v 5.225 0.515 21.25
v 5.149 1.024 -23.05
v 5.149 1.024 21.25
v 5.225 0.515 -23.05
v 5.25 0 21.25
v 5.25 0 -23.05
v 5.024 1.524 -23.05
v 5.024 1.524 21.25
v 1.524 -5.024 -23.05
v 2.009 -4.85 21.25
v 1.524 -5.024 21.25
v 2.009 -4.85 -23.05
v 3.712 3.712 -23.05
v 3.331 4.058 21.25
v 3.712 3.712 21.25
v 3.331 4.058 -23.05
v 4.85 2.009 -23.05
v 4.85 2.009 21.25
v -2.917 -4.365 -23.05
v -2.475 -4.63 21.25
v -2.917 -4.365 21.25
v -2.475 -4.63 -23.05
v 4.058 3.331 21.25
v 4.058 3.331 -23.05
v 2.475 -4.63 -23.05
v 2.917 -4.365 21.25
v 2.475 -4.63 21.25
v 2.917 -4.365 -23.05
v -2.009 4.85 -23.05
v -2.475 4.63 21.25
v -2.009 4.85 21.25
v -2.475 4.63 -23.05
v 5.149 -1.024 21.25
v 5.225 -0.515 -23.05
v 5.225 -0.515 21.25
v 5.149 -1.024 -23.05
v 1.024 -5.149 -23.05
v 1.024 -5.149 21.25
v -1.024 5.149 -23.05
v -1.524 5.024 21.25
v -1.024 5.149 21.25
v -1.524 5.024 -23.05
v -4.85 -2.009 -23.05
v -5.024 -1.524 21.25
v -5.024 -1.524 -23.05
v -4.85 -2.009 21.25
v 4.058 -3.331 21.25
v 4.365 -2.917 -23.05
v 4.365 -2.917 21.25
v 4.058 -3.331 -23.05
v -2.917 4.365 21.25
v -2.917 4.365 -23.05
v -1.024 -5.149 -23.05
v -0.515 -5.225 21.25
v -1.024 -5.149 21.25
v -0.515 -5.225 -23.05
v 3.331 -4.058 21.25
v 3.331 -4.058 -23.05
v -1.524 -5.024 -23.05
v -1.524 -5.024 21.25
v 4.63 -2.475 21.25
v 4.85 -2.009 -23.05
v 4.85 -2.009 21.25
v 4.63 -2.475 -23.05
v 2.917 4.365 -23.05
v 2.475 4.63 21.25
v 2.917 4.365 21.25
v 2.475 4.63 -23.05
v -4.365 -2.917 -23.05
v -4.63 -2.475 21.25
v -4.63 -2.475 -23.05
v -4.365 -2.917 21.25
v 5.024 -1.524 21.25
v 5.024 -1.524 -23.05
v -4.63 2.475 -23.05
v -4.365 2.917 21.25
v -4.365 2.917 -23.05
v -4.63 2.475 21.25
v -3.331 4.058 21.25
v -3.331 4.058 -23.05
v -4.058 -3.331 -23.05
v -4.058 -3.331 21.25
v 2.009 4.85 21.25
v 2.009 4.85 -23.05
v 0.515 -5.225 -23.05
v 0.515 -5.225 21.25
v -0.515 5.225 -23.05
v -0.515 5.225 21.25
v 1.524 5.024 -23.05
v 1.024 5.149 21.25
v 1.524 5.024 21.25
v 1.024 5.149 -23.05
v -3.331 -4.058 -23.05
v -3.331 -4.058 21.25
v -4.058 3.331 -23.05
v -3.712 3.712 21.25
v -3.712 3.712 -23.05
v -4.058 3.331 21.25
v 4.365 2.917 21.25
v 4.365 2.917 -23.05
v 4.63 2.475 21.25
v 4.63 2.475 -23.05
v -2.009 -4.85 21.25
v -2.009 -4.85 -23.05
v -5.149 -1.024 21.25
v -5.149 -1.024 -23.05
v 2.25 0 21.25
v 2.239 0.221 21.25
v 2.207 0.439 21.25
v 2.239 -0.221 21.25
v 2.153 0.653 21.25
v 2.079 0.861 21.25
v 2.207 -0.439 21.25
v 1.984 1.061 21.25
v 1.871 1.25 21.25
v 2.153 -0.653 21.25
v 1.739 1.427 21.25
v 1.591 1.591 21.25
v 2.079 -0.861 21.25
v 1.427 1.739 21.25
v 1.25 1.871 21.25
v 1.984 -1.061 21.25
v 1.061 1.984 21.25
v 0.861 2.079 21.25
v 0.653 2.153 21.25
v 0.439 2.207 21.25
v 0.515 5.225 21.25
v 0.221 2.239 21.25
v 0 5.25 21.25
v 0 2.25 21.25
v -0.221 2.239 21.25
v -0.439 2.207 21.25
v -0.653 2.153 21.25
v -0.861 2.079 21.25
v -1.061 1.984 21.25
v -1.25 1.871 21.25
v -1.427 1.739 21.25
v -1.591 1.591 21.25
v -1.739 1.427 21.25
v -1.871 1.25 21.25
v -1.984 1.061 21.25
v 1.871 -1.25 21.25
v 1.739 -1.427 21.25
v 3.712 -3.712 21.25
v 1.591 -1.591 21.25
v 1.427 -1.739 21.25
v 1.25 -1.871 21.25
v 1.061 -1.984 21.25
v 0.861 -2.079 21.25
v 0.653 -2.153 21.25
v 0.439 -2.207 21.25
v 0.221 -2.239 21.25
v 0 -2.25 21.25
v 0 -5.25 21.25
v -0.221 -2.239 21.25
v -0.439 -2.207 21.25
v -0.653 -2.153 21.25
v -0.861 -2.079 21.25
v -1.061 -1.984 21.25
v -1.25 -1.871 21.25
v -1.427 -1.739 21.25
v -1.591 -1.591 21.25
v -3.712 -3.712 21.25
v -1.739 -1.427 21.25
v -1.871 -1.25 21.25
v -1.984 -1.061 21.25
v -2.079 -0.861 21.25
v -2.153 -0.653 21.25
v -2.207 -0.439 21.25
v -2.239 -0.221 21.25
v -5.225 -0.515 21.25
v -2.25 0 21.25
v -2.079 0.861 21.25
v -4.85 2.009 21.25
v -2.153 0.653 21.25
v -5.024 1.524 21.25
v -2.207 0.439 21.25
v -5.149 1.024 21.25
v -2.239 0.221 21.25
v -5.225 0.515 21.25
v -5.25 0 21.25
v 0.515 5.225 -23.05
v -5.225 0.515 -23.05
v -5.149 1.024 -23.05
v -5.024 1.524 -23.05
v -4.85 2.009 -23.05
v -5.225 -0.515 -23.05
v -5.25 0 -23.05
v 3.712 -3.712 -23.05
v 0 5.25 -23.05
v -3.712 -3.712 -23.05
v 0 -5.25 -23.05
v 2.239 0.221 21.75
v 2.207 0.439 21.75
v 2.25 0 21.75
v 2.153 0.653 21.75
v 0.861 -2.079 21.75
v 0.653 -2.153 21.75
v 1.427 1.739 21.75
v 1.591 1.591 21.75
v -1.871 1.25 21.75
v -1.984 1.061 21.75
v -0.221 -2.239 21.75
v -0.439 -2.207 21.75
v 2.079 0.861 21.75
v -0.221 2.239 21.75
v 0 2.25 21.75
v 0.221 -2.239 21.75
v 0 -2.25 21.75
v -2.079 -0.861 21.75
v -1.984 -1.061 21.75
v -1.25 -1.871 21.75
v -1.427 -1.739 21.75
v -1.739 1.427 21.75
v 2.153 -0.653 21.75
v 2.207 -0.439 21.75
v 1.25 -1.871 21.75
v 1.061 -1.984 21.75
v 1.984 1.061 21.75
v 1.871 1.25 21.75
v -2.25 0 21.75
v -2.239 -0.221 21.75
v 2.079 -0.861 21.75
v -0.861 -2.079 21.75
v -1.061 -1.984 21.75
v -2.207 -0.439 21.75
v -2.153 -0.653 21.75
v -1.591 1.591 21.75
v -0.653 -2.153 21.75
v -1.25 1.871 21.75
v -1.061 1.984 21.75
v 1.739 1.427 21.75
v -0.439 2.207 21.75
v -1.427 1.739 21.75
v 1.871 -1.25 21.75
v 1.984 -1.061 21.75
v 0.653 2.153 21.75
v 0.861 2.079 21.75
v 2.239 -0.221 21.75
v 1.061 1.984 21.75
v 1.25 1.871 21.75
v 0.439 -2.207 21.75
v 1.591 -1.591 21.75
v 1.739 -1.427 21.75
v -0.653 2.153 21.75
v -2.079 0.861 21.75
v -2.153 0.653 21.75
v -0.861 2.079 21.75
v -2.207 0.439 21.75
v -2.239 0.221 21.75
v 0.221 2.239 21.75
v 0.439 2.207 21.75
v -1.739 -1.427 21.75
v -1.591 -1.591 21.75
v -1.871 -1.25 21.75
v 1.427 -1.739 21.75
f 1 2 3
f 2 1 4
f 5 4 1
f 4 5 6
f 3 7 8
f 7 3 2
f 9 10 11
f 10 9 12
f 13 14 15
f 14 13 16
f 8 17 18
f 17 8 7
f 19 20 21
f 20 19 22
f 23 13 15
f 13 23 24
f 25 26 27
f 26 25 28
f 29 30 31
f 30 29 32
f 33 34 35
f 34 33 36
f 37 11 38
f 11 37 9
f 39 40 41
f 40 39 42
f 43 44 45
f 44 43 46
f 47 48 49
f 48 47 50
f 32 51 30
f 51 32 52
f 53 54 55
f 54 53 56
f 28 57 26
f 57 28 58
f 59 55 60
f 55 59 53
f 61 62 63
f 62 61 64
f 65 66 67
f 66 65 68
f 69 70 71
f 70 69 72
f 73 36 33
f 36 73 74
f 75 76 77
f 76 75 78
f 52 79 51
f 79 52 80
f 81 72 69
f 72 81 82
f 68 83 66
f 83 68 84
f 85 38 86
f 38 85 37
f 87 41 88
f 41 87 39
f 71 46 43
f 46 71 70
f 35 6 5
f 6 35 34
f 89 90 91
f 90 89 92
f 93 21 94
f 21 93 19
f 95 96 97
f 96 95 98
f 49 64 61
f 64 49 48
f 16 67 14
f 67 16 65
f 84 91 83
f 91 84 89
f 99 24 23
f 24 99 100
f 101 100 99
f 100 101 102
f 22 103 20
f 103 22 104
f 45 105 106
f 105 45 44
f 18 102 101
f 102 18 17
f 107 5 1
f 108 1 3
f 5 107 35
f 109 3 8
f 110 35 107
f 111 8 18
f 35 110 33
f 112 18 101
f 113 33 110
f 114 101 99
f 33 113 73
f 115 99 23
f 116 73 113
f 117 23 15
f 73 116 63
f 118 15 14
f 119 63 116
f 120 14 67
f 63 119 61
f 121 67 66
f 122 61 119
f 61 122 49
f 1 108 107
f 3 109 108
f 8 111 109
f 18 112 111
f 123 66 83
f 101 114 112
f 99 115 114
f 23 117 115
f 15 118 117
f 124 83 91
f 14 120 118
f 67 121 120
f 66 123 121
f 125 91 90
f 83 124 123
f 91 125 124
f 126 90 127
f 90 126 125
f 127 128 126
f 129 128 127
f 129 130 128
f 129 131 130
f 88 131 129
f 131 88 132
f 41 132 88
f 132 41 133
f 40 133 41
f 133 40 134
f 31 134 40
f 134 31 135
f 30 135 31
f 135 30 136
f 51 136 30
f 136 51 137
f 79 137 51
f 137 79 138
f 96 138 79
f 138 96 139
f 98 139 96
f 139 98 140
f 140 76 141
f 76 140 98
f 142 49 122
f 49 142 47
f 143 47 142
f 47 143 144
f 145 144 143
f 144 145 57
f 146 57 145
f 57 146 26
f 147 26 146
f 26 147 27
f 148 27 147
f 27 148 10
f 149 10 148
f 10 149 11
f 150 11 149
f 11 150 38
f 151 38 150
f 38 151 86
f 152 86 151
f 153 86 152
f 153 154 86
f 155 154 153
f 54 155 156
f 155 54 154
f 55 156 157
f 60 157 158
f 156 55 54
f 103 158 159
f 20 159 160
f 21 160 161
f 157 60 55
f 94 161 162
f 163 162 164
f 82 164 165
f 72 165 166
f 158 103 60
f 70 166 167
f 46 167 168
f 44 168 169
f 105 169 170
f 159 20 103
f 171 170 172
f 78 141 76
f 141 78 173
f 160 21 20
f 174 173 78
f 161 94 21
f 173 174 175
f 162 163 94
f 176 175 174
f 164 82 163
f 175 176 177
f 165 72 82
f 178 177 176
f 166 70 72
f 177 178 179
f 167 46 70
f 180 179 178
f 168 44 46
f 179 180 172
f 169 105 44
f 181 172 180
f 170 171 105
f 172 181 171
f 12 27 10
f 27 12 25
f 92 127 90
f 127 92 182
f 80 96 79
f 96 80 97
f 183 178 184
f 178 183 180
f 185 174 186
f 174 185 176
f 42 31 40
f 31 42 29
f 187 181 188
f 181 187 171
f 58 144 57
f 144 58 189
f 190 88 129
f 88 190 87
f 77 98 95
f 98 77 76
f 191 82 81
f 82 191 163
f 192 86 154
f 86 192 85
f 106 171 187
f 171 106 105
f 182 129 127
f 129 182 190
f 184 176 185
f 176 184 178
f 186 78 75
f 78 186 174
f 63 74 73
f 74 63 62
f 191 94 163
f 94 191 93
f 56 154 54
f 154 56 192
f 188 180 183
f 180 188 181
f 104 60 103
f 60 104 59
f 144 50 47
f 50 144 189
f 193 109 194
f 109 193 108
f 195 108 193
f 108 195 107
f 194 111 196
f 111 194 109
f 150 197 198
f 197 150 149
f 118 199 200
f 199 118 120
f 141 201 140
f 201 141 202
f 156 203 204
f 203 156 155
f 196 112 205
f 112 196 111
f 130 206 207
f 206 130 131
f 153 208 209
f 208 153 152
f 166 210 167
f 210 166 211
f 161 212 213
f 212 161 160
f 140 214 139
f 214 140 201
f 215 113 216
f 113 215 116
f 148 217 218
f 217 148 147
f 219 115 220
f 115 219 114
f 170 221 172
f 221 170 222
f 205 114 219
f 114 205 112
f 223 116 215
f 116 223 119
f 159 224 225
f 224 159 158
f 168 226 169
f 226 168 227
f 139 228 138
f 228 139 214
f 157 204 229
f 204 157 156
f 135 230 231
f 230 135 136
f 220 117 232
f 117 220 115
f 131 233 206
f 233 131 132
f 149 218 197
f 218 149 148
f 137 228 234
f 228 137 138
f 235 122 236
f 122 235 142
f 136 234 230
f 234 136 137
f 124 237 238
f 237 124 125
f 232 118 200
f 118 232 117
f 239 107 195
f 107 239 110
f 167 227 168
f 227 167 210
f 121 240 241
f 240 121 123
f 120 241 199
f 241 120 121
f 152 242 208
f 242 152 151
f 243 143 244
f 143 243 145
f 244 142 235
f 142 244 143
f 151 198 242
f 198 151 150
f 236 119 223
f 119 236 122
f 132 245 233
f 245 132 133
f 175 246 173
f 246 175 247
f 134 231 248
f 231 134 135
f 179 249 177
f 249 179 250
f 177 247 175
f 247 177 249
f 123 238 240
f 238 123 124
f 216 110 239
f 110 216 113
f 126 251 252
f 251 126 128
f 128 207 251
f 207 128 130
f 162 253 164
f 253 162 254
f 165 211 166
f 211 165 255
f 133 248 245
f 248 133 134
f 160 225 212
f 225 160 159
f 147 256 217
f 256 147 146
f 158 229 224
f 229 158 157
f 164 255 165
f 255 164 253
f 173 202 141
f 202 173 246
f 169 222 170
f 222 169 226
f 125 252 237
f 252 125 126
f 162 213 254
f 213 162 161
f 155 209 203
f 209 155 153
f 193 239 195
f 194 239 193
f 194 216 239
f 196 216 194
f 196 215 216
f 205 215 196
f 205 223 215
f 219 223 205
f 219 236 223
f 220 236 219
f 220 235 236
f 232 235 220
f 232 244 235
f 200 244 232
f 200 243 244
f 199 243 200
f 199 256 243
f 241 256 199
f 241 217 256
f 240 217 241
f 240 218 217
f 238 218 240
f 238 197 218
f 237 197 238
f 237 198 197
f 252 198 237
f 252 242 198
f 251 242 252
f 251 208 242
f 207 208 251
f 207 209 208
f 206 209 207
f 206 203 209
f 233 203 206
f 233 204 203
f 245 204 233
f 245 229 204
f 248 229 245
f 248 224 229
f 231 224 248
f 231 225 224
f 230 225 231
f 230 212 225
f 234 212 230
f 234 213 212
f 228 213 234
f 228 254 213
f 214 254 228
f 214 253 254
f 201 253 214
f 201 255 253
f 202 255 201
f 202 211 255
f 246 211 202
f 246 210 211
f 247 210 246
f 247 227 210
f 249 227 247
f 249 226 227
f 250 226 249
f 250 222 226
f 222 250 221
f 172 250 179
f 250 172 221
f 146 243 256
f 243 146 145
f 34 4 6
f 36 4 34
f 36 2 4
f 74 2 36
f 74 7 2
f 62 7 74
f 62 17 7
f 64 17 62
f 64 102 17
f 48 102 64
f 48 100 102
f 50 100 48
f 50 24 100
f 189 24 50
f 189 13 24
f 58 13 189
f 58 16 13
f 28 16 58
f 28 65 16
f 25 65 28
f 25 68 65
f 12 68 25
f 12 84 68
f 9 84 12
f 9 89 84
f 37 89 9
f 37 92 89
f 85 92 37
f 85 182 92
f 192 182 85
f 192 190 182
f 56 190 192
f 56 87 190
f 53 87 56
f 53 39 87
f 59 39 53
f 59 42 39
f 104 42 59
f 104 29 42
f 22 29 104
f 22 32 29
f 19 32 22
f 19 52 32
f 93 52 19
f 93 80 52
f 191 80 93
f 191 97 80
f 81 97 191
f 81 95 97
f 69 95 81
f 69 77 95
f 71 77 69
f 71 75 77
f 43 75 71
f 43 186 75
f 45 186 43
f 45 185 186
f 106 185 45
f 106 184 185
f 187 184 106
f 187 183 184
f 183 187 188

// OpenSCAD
// Parameters
overall_height_mm = 44.5; //[22.25:89:0.1]
outer_diameter_mm = 10.5; //[5.25:21:0.1]
positive_terminal_diameter_mm = 4.5; //[2.25:9:0.1]
positive_terminal_height_mm = 1; //[0.5:2:0.05]
negative_terminal_recess_mm = 0; //[0:1.5:0.1]
edge_fillet_radius_mm = 0.3; //[0:1:0.05]
connection_overlap_mm = 0.8; //[0.2:2:0.1]

// Battery - complete geometry
module battery() {
  color("DimGray") {
    // Main cylindrical body
    translate([0, 0, -positive_terminal_height_mm/2])
      cylinder(h=overall_height_mm - positive_terminal_height_mm, r=outer_diameter_mm/2, center=true, $fn=64);

    // Positive terminal button
    translate([0, 0, (overall_height_mm - positive_terminal_height_mm)/2 - positive_terminal_height_mm/2 - connection_overlap_mm/2])
      cylinder(h=positive_terminal_height_mm + connection_overlap_mm, r=positive_terminal_diameter_mm/2, center=true, $fn=64);

    // Negative terminal face
    translate([0, 0, -(overall_height_mm - positive_terminal_height_mm)/2 - positive_terminal_height_mm/2 + (edge_fillet_radius_mm*2 + connection_overlap_mm)/2 - connection_overlap_mm])
      cylinder(h=edge_fillet_radius_mm*2 + connection_overlap_mm, r=outer_diameter_mm/2, center=true, $fn=64);

    // Negative terminal recess (if any)
    if (negative_terminal_recess_mm > 0) {
      difference() {
        translate([0, 0, -overall_height_mm/2 + negative_terminal_recess_mm/2])
          cylinder(h=negative_terminal_recess_mm, r=outer_diameter_mm/2 - edge_fillet_radius_mm, center=true, $fn=64);
      }
    }
  }
}

// Assembly
module assembly() {
  battery();
}

assembly();
